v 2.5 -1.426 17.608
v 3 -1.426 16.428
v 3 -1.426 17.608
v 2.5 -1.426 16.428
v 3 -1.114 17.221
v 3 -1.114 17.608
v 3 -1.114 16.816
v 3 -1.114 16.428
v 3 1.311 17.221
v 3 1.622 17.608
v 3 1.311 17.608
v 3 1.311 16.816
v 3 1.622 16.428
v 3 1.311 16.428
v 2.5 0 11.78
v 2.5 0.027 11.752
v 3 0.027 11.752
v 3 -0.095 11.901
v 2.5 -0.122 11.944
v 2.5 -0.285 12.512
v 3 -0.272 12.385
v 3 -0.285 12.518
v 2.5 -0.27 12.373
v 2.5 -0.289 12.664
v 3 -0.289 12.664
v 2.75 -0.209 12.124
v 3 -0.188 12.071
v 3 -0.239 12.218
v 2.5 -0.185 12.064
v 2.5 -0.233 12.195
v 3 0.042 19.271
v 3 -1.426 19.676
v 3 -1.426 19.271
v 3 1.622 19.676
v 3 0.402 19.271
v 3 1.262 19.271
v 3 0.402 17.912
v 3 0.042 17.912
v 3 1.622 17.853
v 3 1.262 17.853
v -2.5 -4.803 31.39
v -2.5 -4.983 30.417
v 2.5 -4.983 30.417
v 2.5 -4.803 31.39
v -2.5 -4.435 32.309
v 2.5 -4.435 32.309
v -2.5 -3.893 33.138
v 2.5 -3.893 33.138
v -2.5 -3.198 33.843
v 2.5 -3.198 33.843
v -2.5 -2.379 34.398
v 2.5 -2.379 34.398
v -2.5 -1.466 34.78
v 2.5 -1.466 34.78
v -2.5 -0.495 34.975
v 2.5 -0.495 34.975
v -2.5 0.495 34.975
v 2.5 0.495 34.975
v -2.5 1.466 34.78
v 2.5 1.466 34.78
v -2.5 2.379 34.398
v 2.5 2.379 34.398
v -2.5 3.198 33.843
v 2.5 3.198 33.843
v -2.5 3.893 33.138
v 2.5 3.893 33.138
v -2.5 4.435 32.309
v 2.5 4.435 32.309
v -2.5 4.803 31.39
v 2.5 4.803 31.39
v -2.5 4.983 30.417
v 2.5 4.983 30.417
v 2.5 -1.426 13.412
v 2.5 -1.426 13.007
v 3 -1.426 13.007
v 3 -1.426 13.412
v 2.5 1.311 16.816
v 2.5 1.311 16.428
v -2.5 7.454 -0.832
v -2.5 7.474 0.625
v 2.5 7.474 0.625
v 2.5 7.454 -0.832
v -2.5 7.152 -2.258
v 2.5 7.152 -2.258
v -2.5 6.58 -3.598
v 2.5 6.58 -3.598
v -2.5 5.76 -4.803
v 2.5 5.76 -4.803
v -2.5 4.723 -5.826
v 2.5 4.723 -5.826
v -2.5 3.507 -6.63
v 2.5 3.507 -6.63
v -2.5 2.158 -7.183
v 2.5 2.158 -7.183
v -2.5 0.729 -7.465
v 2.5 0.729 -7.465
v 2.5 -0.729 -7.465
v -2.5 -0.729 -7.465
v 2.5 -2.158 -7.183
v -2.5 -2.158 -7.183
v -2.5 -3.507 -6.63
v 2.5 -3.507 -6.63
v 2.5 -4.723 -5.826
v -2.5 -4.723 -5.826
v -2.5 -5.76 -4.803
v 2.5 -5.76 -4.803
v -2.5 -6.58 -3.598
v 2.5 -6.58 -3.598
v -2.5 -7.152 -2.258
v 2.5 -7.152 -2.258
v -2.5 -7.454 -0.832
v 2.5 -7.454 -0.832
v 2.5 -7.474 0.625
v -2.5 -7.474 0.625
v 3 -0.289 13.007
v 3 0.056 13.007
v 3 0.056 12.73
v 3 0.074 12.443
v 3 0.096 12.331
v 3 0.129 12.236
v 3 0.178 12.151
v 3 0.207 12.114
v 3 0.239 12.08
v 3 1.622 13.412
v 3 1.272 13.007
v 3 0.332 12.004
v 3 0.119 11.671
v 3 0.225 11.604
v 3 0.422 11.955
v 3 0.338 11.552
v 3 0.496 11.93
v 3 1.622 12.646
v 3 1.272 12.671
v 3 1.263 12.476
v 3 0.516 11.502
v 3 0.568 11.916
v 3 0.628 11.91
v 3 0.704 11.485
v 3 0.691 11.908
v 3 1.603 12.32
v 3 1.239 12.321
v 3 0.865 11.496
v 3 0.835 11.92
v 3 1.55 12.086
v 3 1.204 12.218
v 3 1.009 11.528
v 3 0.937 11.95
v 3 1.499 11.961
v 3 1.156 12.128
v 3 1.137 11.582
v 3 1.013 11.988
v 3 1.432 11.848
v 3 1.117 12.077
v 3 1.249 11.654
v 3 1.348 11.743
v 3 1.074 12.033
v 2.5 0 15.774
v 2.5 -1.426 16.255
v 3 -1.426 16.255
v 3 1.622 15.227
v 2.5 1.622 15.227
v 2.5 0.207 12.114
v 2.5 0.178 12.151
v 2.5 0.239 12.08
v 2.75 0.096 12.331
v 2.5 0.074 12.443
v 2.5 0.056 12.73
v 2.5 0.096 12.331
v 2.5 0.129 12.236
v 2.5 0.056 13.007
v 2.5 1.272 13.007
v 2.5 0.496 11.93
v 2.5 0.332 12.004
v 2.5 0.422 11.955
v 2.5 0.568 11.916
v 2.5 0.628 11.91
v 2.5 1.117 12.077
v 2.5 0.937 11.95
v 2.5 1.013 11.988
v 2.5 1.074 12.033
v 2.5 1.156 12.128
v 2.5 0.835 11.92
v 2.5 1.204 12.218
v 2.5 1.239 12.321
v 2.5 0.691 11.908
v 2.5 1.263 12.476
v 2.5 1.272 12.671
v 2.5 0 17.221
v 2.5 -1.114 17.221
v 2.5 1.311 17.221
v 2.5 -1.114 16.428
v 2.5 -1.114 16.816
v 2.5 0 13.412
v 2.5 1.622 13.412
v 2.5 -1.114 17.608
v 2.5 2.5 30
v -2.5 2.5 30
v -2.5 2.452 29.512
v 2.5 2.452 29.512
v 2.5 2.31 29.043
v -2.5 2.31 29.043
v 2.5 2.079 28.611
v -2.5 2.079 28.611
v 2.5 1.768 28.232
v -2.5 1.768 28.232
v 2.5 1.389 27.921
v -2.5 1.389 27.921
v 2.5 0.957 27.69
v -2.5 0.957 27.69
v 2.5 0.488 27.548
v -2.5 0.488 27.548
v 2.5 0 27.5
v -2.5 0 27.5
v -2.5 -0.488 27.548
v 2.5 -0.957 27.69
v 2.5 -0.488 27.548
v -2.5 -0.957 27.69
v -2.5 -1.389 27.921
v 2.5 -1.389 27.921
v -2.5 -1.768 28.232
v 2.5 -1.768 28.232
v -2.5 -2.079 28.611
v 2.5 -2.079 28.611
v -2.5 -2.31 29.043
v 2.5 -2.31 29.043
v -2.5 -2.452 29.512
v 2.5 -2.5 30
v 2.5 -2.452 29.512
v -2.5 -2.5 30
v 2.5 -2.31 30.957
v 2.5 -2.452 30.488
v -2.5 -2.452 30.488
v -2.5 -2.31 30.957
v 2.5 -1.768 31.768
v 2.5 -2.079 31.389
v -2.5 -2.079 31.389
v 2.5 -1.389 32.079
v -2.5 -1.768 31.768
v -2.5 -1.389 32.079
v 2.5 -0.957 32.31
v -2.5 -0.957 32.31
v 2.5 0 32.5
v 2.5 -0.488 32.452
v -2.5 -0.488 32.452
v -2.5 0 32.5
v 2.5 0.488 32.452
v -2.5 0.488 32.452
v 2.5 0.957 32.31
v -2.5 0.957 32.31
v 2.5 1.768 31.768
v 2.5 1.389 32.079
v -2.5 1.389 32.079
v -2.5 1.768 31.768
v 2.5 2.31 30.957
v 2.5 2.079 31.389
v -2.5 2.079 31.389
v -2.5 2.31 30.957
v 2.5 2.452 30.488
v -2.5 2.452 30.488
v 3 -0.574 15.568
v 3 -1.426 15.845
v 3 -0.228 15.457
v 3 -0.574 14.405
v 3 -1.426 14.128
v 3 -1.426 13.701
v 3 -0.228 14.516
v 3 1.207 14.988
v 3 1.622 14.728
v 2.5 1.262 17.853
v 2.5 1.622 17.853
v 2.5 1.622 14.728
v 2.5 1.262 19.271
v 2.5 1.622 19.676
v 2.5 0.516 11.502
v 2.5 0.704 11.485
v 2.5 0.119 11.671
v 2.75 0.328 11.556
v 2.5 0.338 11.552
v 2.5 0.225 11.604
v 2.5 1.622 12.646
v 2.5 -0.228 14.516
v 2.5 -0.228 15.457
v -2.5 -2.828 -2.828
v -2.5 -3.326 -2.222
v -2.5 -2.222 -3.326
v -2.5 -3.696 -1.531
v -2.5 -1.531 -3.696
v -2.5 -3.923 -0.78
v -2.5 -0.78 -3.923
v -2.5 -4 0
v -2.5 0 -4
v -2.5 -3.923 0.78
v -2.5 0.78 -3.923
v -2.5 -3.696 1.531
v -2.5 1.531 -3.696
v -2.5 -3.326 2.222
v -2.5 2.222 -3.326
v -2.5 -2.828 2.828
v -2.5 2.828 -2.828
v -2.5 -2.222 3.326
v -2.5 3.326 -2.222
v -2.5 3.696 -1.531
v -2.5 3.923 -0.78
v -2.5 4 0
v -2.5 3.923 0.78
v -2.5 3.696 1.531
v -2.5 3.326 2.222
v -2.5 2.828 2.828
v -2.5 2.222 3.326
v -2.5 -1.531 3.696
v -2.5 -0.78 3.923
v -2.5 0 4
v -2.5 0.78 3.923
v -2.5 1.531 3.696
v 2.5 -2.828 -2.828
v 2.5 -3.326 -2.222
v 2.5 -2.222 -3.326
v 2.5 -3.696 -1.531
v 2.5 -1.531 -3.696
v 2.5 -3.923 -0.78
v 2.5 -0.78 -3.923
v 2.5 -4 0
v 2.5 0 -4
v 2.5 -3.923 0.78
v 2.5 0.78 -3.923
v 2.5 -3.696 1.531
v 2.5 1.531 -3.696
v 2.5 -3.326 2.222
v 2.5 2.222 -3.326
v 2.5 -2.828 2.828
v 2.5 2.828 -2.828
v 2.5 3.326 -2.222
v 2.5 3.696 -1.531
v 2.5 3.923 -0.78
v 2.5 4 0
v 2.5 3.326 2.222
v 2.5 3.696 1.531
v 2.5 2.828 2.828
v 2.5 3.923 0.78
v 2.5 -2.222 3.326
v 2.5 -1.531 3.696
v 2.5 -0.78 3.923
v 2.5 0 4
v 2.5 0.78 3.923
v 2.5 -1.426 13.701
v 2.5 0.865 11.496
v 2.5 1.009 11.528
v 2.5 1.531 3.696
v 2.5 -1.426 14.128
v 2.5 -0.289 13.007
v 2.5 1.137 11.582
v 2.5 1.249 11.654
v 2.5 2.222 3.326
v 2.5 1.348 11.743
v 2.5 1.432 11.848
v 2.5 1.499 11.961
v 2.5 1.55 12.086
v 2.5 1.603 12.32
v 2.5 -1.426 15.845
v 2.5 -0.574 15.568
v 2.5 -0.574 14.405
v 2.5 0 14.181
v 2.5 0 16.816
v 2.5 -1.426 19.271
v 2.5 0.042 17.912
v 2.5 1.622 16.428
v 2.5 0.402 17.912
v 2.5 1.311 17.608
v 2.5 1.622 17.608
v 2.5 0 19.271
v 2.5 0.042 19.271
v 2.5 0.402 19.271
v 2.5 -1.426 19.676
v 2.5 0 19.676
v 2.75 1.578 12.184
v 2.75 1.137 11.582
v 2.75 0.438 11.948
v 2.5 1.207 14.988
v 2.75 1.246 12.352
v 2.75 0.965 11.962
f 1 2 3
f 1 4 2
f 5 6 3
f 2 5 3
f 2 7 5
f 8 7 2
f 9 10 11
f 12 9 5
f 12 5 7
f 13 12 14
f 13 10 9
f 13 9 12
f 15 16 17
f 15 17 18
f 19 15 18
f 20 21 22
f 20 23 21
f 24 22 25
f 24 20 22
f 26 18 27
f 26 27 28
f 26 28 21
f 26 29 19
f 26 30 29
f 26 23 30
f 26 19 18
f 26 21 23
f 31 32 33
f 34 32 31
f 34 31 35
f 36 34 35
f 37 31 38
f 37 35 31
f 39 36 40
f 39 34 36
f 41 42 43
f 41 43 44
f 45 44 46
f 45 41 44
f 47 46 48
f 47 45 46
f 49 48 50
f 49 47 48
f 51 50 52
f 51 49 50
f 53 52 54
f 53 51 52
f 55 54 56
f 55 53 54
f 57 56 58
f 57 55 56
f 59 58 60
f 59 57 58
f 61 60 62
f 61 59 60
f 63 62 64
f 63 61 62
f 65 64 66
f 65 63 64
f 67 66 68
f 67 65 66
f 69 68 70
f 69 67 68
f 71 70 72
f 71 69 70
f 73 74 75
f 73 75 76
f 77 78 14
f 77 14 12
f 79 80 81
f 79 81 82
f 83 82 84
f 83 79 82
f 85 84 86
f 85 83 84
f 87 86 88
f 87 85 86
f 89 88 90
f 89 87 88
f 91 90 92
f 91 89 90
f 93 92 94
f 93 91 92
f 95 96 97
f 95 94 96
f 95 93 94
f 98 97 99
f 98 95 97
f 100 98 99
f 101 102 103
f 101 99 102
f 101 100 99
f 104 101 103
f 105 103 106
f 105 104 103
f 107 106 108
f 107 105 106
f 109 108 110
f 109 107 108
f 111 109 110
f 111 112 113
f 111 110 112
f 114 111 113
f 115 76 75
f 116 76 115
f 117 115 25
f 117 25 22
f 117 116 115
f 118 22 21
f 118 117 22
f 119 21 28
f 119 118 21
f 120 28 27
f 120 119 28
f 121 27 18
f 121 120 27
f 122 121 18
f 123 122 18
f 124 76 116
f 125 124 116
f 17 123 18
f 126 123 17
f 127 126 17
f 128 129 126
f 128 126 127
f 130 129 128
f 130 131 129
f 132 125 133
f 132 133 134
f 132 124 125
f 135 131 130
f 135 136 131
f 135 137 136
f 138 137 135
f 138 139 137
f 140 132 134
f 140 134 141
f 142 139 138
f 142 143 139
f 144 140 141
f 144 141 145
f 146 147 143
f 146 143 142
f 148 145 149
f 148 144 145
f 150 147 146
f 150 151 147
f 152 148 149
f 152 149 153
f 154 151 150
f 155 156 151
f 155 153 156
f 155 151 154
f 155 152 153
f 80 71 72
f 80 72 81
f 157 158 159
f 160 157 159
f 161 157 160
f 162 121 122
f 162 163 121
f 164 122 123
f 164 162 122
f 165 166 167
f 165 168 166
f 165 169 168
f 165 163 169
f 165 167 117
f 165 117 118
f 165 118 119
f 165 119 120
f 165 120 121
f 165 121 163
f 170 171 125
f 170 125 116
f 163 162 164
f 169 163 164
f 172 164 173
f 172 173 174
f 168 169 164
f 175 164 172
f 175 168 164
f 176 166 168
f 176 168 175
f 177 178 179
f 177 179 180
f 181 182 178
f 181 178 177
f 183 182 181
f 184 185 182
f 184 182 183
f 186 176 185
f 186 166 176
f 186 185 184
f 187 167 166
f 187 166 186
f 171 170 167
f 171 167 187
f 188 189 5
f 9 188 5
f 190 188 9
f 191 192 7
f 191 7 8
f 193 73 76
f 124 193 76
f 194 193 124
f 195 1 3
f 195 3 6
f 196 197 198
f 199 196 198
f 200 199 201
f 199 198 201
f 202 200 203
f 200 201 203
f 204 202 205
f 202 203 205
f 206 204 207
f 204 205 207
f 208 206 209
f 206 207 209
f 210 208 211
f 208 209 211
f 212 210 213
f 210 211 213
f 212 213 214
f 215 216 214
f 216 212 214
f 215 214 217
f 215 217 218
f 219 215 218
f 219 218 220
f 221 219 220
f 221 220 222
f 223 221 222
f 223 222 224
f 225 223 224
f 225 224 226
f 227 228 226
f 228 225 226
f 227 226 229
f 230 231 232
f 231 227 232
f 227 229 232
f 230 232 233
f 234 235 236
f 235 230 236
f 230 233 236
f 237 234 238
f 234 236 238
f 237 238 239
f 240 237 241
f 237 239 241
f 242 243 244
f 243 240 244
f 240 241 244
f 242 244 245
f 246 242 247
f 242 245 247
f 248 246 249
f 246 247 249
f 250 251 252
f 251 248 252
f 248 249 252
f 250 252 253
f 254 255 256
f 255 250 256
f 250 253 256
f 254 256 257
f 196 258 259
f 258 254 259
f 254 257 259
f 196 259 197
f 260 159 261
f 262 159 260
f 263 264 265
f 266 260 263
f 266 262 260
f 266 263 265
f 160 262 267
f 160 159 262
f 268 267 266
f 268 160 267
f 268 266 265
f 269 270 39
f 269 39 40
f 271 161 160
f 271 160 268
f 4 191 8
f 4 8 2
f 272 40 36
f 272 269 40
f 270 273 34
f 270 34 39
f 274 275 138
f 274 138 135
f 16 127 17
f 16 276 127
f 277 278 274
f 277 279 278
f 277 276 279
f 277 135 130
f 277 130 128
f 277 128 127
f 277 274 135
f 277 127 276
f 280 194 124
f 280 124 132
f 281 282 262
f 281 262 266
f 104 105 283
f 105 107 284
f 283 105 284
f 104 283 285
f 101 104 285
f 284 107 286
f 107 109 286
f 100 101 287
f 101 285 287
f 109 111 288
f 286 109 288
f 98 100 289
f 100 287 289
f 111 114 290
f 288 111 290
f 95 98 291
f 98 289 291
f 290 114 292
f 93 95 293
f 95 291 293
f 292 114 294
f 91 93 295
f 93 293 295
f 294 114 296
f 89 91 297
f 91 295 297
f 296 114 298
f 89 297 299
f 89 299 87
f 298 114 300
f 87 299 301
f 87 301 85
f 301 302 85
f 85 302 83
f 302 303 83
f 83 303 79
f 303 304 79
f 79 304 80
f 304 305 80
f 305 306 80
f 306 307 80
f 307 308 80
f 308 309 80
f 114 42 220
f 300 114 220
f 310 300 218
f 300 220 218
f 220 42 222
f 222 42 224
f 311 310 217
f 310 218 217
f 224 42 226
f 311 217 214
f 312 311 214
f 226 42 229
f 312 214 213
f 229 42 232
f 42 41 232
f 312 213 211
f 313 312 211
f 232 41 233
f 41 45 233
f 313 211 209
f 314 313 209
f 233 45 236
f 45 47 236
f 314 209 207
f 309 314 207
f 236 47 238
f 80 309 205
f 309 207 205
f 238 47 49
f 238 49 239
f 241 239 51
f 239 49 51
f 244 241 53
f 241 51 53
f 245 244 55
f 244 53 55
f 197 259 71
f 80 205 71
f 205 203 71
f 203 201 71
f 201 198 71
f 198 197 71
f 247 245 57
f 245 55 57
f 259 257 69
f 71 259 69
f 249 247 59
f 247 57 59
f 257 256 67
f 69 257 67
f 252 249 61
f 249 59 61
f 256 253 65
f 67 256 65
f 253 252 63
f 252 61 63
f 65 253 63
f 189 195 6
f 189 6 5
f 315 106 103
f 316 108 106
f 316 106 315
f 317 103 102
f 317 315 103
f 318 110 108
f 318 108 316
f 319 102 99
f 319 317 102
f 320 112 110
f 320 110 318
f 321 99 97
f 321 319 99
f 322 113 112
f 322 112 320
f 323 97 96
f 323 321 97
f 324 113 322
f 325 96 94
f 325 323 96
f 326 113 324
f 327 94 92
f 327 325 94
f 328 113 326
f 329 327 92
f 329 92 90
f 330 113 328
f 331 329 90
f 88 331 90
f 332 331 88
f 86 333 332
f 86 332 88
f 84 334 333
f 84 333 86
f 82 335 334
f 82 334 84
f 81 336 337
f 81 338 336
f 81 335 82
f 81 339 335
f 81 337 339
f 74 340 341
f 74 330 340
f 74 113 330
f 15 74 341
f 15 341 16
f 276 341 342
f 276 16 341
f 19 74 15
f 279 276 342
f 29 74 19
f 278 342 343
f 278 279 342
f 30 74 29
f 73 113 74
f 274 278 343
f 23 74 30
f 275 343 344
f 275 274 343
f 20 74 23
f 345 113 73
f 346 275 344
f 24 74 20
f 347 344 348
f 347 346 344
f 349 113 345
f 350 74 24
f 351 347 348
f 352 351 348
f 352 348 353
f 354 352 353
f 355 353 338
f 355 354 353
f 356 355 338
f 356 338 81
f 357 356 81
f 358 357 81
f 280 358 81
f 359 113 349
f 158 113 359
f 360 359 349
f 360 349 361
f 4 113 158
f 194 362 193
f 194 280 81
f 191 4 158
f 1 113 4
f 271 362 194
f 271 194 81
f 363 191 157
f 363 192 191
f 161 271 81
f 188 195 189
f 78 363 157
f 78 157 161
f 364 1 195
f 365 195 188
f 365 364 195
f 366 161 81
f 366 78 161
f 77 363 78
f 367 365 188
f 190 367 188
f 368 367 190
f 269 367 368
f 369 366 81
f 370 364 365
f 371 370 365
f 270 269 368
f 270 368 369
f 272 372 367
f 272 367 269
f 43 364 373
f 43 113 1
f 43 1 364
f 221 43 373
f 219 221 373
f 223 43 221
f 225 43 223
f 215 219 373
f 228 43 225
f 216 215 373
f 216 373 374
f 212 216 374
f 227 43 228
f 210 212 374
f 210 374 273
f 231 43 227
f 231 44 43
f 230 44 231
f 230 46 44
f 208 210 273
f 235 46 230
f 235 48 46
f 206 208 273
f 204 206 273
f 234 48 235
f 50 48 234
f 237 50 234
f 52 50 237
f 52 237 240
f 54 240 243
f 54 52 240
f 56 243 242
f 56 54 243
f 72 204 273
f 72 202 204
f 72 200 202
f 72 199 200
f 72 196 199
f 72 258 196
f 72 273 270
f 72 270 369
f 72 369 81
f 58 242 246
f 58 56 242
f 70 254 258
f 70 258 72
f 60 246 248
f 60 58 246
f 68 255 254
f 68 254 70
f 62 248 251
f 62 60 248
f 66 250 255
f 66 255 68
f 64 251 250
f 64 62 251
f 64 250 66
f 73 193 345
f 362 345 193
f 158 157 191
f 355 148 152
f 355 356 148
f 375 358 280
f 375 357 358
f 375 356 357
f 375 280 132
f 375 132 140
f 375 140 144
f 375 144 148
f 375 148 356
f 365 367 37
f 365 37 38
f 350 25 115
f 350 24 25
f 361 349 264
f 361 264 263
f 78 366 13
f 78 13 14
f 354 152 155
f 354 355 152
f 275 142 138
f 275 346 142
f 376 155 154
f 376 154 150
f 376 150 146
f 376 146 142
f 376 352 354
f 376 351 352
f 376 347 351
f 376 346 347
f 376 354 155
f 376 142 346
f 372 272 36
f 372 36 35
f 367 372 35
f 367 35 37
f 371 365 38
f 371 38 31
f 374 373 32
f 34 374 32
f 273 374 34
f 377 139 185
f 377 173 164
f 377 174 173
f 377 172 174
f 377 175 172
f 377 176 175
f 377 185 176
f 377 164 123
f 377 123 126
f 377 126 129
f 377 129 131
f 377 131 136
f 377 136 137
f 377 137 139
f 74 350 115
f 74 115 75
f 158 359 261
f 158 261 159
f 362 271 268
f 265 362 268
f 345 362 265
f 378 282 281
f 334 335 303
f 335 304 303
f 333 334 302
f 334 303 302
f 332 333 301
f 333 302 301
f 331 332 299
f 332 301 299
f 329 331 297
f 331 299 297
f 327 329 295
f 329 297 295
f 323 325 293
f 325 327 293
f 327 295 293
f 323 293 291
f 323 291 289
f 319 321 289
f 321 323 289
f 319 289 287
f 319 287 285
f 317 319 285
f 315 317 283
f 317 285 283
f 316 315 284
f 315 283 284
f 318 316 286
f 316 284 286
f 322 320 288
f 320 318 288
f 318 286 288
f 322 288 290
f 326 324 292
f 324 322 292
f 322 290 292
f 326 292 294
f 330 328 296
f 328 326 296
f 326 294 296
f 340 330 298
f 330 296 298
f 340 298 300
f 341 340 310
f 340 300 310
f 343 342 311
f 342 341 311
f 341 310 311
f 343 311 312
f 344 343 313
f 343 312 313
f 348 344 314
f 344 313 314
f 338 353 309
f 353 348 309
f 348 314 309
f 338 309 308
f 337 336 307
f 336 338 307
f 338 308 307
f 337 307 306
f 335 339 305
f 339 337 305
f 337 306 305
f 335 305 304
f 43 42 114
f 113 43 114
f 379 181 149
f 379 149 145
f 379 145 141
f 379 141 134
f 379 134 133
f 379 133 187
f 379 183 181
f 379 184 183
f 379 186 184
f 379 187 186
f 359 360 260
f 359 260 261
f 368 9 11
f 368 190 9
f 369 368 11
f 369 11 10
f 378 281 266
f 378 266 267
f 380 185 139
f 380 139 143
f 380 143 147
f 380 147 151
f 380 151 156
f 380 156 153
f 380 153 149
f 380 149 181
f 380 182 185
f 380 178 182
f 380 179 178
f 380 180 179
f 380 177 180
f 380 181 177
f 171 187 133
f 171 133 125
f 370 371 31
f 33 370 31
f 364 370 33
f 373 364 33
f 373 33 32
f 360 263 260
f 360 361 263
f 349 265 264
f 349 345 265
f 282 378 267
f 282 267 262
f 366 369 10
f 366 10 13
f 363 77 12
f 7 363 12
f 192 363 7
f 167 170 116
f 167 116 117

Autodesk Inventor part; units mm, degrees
ref_plane "YZ Plane" through (0, 0, 0) normal (1, 0, 0) x (0, 1, 0)
ref_plane "XZ Plane" through (0, 0, 0) normal (0, 1, 0) x (-1, 0, 0)
ref_plane "XY Plane" through (0, 0, 0) normal (0, 0, 1) x (1, 0, 0)
sketch "Esboço1" plane through (0, 0, 0) normal (1, 0, 0) x (0, 1, 0)
  line L0 (0, 0) -> (0, 30)
  circle A0 centre (0, 0) radius 4
  circle A1 centre (0, 30) radius 2.5
  arc A2 (4.9826, 30.4167) -> (-4.9826, 30.4167) centre (0, 30) ccw
  arc A3 (-7.4739, 0.625) -> (7.4739, 0.625) centre (0, 0) ccw
  line L1 (4.9826, 30.4167) -> (7.4739, 0.625)
  line L2 (-4.9826, 30.4167) -> (-7.4739, 0.625)
extrude "Extrusão1" add sketch "Esboço1" along normal mid plane 5
sketch "Esboço2" plane through (2.5, 0, 0) normal (1, 0, 0) x (0, 0, -1)
  line L0 (-19.9846, 1.6224) -> (-11.4087, 1.6224) construction
  line L1 (-11.4087, 1.6224) -> (-11.4087, -1.4256) construction
  line L2 (-11.4087, -1.4256) -> (-19.9846, -1.4256) construction
  line L3 (-19.9846, -1.4256) -> (-19.9846, 1.6224) construction
  circle A0 centre (-30, 0) radius 2.5 projected
  line L4 (-17.853, 1.2618) -> (-19.2708, 1.2618)
  line L5 (-19.2708, 1.2618) -> (-19.2708, 0.4022)
  line L6 (-19.2708, 0.4022) -> (-17.9122, 0.4022)
  line L7 (-17.9122, 0.4022) -> (-17.9122, 0.0416)
  line L8 (-17.9122, 0.0416) -> (-19.2708, 0.0416)
  line L9 (-19.2708, 0.0416) -> (-19.2708, -1.4256)
  line L10 (-19.2708, -1.4256) -> (-19.6758, -1.4256)
  line L11 (-19.6758, -1.4256) -> (-19.6758, 1.6224)
  line L12 (-19.6758, 1.6224) -> (-17.853, 1.6224)
  line L13 (-17.853, 1.6224) -> (-17.853, 1.2618)
  line L14 (-16.4278, -1.4256) -> (-17.6084, -1.4256)
  line L15 (-17.6084, -1.4256) -> (-17.6084, -1.1144)
  line L16 (-17.6084, -1.1144) -> (-17.2206, -1.1144)
  line L17 (-17.2206, -1.1144) -> (-17.2206, 1.3112)
  line L18 (-17.2206, 1.3112) -> (-17.6084, 1.3112)
  line L19 (-17.6084, 1.3112) -> (-17.6084, 1.6224)
  line L20 (-17.6084, 1.6224) -> (-16.4278, 1.6224)
  line L21 (-16.4278, 1.6224) -> (-16.4278, 1.3112)
  line L22 (-16.4278, 1.3112) -> (-16.8156, 1.3112)
  line L23 (-16.8156, 1.3112) -> (-16.8156, -1.1144)
  line L24 (-16.8156, -1.1144) -> (-16.4278, -1.1144)
  line L25 (-16.4278, -1.1144) -> (-16.4278, -1.4256)
  line L26 (-16.2549, -1.4256) -> (-15.2273, 1.6224)
  line L27 (-15.2273, 1.6224) -> (-14.7284, 1.6224)
  line L28 (-14.7284, 1.6224) -> (-13.7009, -1.4256)
  line L29 (-13.7009, -1.4256) -> (-14.1282, -1.4256)
  line L30 (-14.1282, -1.4256) -> (-14.4048, -0.5735)
  line L31 (-14.4048, -0.5735) -> (-15.5682, -0.5735)
  line L32 (-15.5682, -0.5735) -> (-15.8448, -1.4256)
  line L33 (-15.8448, -1.4256) -> (-16.2549, -1.4256)
  line L34 (-14.516, -0.2276) -> (-14.9877, 1.2074)
  line L35 (-14.9877, 1.2074) -> (-15.457, -0.2276)
  line L36 (-15.457, -0.2276) -> (-14.516, -0.2276)
  spline S0 degree 2 poles (-11.4853, 0.7035) (-11.4853, 0.5059) (-11.6261, 0.1503) (-11.752, 0.0268) knots 0 0 0 1 2 2 2
  spline S1 degree 2 poles (-11.752, 0.0268) (-11.9101, -0.1288) (-12.3374, -0.2894) (-12.6635, -0.2894) knots 0 0 0 1 2 2 2
  line L37 (-12.6635, -0.2894) -> (-13.0068, -0.2894)
  line L38 (-13.0068, -0.2894) -> (-13.0068, -1.4256)
  line L39 (-13.0068, -1.4256) -> (-13.4119, -1.4256)
  line L40 (-13.4119, -1.4256) -> (-13.4119, 1.6224)
  line L41 (-13.4119, 1.6224) -> (-12.6462, 1.6224)
  spline S2 degree 2 poles (-12.6462, 1.6224) (-12.3745, 1.6224) (-11.9941, 1.5335) (-11.8484, 1.4322) knots 0 0 0 1 2 2 2
  spline S3 degree 2 poles (-11.8484, 1.4322) (-11.6779, 1.3161) (-11.4853, 0.958) (-11.4853, 0.7035) knots 0 0 0 1 2 2 2
  spline S4 degree 2 poles (-11.9076, 0.6912) (-11.9076, 0.8493) (-12.0163, 1.0815) (-12.1275, 1.1556) knots 0 0 0 1 2 2 2
  spline S5 degree 2 poles (-12.1275, 1.1556) (-12.2238, 1.2198) (-12.4807, 1.2717) (-12.6709, 1.2717) knots 0 0 0 1 2 2 2
  line L42 (-12.6709, 1.2717) -> (-13.0068, 1.2717)
  line L43 (-13.0068, 1.2717) -> (-13.0068, 0.0564)
  line L44 (-13.0068, 0.0564) -> (-12.7302, 0.0564)
  spline S6 degree 2 poles (-12.7302, 0.0564) (-12.4831, 0.0564) (-12.1793, 0.1354) (-12.0805, 0.2392) knots 0 0 0 1 2 2 2
  spline S7 degree 2 poles (-12.0805, 0.2392) (-11.9891, 0.3306) (-11.9076, 0.5455) (-11.9076, 0.6912) knots 0 0 0 1 2 2 2
  point P0 (0, 0)
extrude "Extrusão2" add sketch "Esboço2" along normal blind 0.5 contours L4 L5 L6 L7 L8 L9 L10 L11 L12 L13 | L14 L15 L16 L17 L18 L19 L20 L21 L22 L23 L24 L25 | L26 L27 L28 L29 L30 L31 L32 L33 | S0 S1 L37 L38 L39 L40 L41 S2 S3
